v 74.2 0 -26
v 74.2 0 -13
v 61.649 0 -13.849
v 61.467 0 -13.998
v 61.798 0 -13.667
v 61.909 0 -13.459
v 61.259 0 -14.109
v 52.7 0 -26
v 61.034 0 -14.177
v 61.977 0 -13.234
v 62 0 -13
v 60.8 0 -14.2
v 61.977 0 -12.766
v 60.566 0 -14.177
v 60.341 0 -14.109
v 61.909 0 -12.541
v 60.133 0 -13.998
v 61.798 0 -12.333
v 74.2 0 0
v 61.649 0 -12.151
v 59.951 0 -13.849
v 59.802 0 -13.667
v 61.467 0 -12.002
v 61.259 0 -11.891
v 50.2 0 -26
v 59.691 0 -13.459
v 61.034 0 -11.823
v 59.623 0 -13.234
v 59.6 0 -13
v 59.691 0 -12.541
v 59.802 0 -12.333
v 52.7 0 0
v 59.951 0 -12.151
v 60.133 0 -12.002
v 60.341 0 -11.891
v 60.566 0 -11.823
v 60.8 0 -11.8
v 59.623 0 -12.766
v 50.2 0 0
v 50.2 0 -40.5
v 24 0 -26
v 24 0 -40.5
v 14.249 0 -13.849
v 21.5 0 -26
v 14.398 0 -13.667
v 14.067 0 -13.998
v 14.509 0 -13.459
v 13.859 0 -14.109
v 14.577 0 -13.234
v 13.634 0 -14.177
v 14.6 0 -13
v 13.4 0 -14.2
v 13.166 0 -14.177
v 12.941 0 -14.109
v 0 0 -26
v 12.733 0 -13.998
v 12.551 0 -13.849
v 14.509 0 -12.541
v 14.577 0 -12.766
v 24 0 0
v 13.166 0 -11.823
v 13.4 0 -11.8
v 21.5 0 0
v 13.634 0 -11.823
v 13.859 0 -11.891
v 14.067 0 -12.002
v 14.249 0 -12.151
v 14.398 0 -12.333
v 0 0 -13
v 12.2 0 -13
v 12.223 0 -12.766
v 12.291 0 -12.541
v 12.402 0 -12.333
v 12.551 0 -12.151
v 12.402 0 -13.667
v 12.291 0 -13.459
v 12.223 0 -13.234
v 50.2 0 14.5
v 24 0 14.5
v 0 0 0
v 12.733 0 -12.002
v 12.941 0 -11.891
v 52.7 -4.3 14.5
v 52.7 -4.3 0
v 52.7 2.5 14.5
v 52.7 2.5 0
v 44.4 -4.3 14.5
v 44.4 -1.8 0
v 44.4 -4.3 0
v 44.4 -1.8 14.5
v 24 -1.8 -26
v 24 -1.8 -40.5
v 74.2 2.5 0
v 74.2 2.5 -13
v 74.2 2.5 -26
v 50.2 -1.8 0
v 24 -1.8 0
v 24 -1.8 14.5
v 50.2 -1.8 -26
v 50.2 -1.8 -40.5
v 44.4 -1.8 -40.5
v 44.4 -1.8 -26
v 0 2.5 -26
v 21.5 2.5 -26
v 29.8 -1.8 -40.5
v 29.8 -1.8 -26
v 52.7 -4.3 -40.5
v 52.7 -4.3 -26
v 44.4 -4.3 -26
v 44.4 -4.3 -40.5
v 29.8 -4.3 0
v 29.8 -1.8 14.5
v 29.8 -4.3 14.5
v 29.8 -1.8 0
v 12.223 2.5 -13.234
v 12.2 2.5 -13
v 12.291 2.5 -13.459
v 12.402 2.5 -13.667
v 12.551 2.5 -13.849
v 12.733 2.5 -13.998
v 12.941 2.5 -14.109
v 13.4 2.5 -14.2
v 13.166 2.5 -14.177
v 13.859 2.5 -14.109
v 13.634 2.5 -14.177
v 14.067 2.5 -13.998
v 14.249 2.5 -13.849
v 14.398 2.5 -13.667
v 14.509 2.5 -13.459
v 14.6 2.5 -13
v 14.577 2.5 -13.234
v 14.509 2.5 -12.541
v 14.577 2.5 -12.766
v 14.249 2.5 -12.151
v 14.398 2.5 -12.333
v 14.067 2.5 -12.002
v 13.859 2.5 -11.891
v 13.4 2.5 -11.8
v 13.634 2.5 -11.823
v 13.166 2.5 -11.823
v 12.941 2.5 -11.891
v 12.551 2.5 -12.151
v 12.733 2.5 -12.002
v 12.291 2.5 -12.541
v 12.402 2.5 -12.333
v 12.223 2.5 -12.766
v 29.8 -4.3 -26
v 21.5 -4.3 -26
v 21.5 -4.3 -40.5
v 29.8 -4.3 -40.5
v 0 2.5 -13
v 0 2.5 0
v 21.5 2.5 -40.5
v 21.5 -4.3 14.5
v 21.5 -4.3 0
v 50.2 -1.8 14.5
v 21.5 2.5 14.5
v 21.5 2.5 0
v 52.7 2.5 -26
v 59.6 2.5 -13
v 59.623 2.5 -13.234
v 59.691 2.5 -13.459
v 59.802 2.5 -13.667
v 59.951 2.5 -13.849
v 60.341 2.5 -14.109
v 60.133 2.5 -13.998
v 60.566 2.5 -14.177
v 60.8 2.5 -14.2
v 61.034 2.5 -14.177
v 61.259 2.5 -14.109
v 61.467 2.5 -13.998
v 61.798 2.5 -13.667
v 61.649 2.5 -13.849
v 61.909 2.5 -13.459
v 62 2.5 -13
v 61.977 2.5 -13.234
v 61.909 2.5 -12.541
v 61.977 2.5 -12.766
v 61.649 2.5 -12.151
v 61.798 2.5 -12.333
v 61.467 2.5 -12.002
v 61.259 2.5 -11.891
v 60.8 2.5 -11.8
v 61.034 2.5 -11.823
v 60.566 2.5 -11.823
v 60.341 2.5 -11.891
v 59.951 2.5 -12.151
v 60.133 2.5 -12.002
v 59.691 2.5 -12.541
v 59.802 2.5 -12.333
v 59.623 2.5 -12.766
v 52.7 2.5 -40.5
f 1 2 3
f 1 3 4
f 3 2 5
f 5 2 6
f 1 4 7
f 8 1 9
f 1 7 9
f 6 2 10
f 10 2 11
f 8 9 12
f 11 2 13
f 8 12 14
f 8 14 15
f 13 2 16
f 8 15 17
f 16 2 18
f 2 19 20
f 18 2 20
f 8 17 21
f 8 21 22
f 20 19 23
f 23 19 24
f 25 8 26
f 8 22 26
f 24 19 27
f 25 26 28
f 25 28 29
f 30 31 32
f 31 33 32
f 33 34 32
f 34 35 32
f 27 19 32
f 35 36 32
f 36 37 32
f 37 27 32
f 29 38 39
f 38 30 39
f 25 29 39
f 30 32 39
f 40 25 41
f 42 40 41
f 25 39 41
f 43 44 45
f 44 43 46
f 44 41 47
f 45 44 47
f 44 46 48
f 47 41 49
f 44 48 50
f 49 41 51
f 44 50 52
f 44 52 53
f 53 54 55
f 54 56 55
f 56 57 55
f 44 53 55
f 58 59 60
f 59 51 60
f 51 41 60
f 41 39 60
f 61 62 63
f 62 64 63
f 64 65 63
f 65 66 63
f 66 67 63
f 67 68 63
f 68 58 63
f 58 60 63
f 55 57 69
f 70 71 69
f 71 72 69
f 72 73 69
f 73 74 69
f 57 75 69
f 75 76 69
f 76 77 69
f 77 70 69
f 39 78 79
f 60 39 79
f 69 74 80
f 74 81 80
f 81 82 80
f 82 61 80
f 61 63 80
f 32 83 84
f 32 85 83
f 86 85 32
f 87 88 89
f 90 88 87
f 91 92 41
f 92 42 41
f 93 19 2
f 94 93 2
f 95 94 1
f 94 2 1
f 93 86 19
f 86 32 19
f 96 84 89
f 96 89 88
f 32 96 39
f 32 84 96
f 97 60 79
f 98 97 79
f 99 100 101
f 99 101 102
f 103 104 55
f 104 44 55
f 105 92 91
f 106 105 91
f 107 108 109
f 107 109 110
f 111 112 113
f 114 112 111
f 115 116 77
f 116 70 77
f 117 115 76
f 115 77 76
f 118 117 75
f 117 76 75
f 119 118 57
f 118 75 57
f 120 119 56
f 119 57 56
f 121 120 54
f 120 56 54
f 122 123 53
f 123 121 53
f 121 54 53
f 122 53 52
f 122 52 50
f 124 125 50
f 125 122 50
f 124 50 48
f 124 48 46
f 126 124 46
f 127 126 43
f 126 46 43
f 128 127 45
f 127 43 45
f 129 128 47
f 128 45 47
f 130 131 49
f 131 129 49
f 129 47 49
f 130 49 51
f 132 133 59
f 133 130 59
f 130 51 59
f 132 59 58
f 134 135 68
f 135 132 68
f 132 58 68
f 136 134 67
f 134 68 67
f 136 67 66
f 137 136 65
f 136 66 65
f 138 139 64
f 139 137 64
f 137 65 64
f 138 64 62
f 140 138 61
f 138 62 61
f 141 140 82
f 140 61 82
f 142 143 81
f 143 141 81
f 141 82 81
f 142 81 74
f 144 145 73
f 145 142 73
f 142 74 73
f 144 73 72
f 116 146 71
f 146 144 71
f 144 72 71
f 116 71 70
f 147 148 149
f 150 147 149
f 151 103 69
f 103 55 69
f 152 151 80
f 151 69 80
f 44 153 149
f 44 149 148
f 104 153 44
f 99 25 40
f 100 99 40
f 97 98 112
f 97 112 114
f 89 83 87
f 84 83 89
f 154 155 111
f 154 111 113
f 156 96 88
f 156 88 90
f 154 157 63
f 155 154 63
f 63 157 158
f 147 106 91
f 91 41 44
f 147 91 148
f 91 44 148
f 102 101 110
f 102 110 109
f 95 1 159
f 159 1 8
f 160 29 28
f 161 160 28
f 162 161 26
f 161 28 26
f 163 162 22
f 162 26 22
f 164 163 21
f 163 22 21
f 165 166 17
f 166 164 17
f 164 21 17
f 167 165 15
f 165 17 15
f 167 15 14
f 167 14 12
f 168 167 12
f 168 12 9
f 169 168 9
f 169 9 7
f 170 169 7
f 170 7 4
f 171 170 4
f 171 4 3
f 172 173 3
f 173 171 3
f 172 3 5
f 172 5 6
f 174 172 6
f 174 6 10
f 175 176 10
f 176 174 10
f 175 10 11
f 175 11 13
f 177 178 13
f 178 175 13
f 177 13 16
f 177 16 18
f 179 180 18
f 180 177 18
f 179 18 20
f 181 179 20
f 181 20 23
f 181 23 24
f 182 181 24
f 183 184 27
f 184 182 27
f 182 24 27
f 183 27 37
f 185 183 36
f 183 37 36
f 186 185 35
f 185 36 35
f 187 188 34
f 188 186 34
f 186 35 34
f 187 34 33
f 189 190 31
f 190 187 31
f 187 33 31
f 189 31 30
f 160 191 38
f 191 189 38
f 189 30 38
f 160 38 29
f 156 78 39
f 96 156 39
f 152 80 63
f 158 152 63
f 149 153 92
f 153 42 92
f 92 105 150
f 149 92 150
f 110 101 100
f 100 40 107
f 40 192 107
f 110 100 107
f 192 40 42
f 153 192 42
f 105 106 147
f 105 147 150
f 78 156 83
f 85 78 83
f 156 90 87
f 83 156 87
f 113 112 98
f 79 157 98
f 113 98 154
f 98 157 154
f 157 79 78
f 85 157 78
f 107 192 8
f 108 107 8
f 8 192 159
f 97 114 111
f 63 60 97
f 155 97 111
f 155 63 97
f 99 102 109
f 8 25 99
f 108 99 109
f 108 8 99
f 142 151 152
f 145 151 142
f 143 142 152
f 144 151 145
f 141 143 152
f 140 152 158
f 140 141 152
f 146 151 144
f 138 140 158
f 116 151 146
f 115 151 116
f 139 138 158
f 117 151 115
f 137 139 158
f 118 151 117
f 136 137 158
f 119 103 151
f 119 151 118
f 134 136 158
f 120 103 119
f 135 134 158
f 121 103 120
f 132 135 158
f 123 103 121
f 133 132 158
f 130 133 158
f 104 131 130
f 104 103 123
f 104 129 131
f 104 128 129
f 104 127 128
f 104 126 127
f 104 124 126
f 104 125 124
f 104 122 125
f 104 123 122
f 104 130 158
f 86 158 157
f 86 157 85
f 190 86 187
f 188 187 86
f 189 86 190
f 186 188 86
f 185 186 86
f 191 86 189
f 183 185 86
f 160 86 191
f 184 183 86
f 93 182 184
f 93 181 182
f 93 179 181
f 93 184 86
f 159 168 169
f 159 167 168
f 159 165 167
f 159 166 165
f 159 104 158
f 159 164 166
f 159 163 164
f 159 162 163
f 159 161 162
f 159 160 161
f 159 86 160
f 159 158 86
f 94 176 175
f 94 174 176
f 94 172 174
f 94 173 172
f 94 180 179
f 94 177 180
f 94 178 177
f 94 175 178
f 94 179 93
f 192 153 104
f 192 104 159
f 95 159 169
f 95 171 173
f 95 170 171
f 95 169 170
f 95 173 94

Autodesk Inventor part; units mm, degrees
ref_plane "YZ Plane" through (0, 0, 0) normal (1, 0, 0) x (0, 1, 0)
ref_plane "XZ Plane" through (0, 0, 0) normal (0, 1, 0) x (-1, 0, 0)
ref_plane "XY Plane" through (0, 0, 0) normal (0, 0, 1) x (1, 0, 0)
sketch "Sketch3" plane through (0, 0, 0) normal (0, 1, 0) x (-1, 0, 0)
  line L0 (-74.2, 0) -> (-74.2, -26)
  line L1 (0, -26) -> (0, 0)
  line L2 (0, 0) -> (-24, 0)
  line L3 (-24, 0) -> (-24, 14.5)
  line L4 (-24, 14.5) -> (-50.2, 14.5)
  line L5 (-50.2, 14.5) -> (-50.2, 0)
  line L6 (-50.2, -26) -> (-50.2, -40.5)
  line L7 (-50.2, -40.5) -> (-24, -40.5)
  line L8 (-24, -40.5) -> (-24, -26)
  line L9 (0, -13) -> (-13.4, -13)
  line L10 (-74.2, -13) -> (-60.8, -13)
  line L11 (0, 0) -> (-24, 0)
  line L12 (-50.2, 0) -> (-74.2, 0)
  line L13 (-74.2, -26) -> (-50.2, -26)
  line L14 (-24, -26) -> (0, -26)
  circle A0 centre (-13.4, -13) radius 1.2
  circle A1 centre (-60.8, -13) radius 1.2
  dimension "d2" = 74.2
  dimension "d3" = 26
  dimension "d4" = 24
  dimension "d5" = 14.5
  dimension "d6" = 26.2
  dimension "d7" = 14.5
  dimension "d8" = 26.2
  dimension "d9" = 13.4
  dimension "d10" = 13.4
  dimension "d11" = 2.4
  dimension "d12" = 2.4
extrude "Extrusion1" add sketch "Sketch3" along normal blind 2.5
sketch "Sketch4" plane through (50.2, 0, 14.5) normal (1, 0, 0) x (0, 0, -1)
  point P0 (14.5, 0)
sketch "Sketch5" plane through (0, 2.5, 0) normal (0, 1, 0) x (1, 0, 0)
  line L0 (24, -14.5) -> (50.2, -14.5) projected
  line L1 (24, -14.5) -> (21.5, -14.5)
  line L2 (21.5, -14.5) -> (21.5, 0)
  line L3 (21.5, 0) -> (24, 0)
  line L4 (24, 0) -> (24, -14.5)
  point P0 (0, 0)
  dimension "d15" = 2.5
extrude "Extrusion2" add sketch "Sketch5" against normal blind 6.8
sketch "Sketch6" plane through (0, 2.5, 0) normal (0, 1, 0) x (1, 0, 0)
  line L0 (50.2, -14.5) -> (50.2, 0) projected
  line L1 (50.2, -14.5) -> (52.7, -14.5)
  line L2 (52.7, -14.5) -> (52.7, 0)
  line L3 (50.2, 0) -> (74.2, 0) projected
  line L4 (50.2, 0) -> (50.2, -14.5)
  point P0 (0, 0)
  dimension "d18" = 2.5
extrude "Extrusion3" add sketch "Sketch6" against normal blind 6.8
sketch "Sketch7" plane through (0, 2.5, 0) normal (0, 1, 0) x (1, 0, 0)
  line L0 (24, 40.5) -> (24, 26) projected
  line L1 (24, 40.5) -> (21.5, 40.5)
  line L2 (21.5, 40.5) -> (21.5, 26)
  line L3 (21.5, 26) -> (24, 26)
  line L4 (24, 26) -> (24, 40.5)
  point P0 (0, 0)
  dimension "d21" = 2.5
extrude "Extrusion4" add sketch "Sketch7" against normal blind 6.8
sketch "Sketch8" plane through (0, 2.5, 0) normal (0, 1, 0) x (1, 0, 0)
  line L0 (50.2, 26) -> (50.2, 40.5) projected
  line L1 (50.2, 40.5) -> (52.7, 40.5)
  line L2 (52.7, 40.5) -> (52.7, 26)
  line L3 (52.7, 26) -> (50.2, 26)
  line L4 (50.2, 26) -> (50.2, 40.5)
  point P0 (0, 0)
  dimension "d24" = 2.5
extrude "Extrusion5" add sketch "Sketch8" against normal blind 6.8
sketch "Sketch9" plane through (24, 0, -26) normal (1, 0, 0) x (0, 0, -1)
  line L0 (14.5, 0) -> (14.5, -4.3) projected
  line L1 (14.5, -4.3) -> (14.5, -1.8)
  line L2 (14.5, -1.8) -> (0, -1.8)
  line L3 (0, -1.8) -> (0, -4.3)
  line L4 (0, -4.3) -> (14.5, -4.3)
  point P0 (-26, 0)
  dimension "d27" = 2.5
extrude "Extrusion6" add sketch "Sketch9" along normal blind 5.8
sketch "Sketch10" plane through (50.2, 0, -40.5) normal (-1, 0, 0) x (0, 0, 1)
  line L0 (0, 0) -> (0, -4.3) projected
  line L1 (0, -4.3) -> (0, -1.8)
  line L2 (0, -1.8) -> (14.5, -1.8)
  line L3 (14.5, 0) -> (14.5, -4.3) projected
  line L4 (14.5, -1.8) -> (14.5, -4.3)
  line L5 (14.5, -4.3) -> (0, -4.3)
  point P0 (40.5, 0)
  dimension "d30" = 2.5
extrude "Extrusion7" add sketch "Sketch10" along normal blind 5.8
sketch "Sketch11" plane through (50.2, 0, 0) normal (-1, 0, 0) x (0, 0, 1)
  line L0 (14.5, -4.3) -> (0, -4.3) projected
  line L1 (0, -4.3) -> (0, -1.8)
  line L2 (0, 0) -> (0, -4.3) projected
  arc A0 (-2.0781, -1.1028) -> (0, -1.8) centre (0, 1.6455) ccw
  line L3 (0, -1.8) -> (14.5, -1.8)
  line L4 (14.5, -1.8) -> (14.5, -4.3)
  line L5 (0, 0) -> (0, -4.3) projected
  line L6 (14.5, 2.5) -> (14.5, -4.3) projected
  line L7 (0, -4.3) -> (14.5, -4.3)
  dimension "d33" = 2.5
extrude "Extrusion8" add sketch "Sketch11" along normal blind 5.8
sketch "Sketch12" plane through (24, 0, 14.5) normal (1, 0, 0) x (0, 0, -1)
  line L0 (0, 0) -> (0, -4.3) projected
  line L1 (0, -4.3) -> (0, -1.8)
  line L2 (0, -1.8) -> (14.5, -1.8)
  line L3 (14.5, -4.3) -> (0, -4.3) projected
  line L4 (14.5, -1.8) -> (14.5, -4.3)
  line L5 (14.5, -4.3) -> (0, -4.3)
  point P0 (14.5, 0)
  dimension "d36" = 2.5
extrude "Extrusion9" add sketch "Sketch12" along normal blind 5.8
properties part number "cam_holder"
